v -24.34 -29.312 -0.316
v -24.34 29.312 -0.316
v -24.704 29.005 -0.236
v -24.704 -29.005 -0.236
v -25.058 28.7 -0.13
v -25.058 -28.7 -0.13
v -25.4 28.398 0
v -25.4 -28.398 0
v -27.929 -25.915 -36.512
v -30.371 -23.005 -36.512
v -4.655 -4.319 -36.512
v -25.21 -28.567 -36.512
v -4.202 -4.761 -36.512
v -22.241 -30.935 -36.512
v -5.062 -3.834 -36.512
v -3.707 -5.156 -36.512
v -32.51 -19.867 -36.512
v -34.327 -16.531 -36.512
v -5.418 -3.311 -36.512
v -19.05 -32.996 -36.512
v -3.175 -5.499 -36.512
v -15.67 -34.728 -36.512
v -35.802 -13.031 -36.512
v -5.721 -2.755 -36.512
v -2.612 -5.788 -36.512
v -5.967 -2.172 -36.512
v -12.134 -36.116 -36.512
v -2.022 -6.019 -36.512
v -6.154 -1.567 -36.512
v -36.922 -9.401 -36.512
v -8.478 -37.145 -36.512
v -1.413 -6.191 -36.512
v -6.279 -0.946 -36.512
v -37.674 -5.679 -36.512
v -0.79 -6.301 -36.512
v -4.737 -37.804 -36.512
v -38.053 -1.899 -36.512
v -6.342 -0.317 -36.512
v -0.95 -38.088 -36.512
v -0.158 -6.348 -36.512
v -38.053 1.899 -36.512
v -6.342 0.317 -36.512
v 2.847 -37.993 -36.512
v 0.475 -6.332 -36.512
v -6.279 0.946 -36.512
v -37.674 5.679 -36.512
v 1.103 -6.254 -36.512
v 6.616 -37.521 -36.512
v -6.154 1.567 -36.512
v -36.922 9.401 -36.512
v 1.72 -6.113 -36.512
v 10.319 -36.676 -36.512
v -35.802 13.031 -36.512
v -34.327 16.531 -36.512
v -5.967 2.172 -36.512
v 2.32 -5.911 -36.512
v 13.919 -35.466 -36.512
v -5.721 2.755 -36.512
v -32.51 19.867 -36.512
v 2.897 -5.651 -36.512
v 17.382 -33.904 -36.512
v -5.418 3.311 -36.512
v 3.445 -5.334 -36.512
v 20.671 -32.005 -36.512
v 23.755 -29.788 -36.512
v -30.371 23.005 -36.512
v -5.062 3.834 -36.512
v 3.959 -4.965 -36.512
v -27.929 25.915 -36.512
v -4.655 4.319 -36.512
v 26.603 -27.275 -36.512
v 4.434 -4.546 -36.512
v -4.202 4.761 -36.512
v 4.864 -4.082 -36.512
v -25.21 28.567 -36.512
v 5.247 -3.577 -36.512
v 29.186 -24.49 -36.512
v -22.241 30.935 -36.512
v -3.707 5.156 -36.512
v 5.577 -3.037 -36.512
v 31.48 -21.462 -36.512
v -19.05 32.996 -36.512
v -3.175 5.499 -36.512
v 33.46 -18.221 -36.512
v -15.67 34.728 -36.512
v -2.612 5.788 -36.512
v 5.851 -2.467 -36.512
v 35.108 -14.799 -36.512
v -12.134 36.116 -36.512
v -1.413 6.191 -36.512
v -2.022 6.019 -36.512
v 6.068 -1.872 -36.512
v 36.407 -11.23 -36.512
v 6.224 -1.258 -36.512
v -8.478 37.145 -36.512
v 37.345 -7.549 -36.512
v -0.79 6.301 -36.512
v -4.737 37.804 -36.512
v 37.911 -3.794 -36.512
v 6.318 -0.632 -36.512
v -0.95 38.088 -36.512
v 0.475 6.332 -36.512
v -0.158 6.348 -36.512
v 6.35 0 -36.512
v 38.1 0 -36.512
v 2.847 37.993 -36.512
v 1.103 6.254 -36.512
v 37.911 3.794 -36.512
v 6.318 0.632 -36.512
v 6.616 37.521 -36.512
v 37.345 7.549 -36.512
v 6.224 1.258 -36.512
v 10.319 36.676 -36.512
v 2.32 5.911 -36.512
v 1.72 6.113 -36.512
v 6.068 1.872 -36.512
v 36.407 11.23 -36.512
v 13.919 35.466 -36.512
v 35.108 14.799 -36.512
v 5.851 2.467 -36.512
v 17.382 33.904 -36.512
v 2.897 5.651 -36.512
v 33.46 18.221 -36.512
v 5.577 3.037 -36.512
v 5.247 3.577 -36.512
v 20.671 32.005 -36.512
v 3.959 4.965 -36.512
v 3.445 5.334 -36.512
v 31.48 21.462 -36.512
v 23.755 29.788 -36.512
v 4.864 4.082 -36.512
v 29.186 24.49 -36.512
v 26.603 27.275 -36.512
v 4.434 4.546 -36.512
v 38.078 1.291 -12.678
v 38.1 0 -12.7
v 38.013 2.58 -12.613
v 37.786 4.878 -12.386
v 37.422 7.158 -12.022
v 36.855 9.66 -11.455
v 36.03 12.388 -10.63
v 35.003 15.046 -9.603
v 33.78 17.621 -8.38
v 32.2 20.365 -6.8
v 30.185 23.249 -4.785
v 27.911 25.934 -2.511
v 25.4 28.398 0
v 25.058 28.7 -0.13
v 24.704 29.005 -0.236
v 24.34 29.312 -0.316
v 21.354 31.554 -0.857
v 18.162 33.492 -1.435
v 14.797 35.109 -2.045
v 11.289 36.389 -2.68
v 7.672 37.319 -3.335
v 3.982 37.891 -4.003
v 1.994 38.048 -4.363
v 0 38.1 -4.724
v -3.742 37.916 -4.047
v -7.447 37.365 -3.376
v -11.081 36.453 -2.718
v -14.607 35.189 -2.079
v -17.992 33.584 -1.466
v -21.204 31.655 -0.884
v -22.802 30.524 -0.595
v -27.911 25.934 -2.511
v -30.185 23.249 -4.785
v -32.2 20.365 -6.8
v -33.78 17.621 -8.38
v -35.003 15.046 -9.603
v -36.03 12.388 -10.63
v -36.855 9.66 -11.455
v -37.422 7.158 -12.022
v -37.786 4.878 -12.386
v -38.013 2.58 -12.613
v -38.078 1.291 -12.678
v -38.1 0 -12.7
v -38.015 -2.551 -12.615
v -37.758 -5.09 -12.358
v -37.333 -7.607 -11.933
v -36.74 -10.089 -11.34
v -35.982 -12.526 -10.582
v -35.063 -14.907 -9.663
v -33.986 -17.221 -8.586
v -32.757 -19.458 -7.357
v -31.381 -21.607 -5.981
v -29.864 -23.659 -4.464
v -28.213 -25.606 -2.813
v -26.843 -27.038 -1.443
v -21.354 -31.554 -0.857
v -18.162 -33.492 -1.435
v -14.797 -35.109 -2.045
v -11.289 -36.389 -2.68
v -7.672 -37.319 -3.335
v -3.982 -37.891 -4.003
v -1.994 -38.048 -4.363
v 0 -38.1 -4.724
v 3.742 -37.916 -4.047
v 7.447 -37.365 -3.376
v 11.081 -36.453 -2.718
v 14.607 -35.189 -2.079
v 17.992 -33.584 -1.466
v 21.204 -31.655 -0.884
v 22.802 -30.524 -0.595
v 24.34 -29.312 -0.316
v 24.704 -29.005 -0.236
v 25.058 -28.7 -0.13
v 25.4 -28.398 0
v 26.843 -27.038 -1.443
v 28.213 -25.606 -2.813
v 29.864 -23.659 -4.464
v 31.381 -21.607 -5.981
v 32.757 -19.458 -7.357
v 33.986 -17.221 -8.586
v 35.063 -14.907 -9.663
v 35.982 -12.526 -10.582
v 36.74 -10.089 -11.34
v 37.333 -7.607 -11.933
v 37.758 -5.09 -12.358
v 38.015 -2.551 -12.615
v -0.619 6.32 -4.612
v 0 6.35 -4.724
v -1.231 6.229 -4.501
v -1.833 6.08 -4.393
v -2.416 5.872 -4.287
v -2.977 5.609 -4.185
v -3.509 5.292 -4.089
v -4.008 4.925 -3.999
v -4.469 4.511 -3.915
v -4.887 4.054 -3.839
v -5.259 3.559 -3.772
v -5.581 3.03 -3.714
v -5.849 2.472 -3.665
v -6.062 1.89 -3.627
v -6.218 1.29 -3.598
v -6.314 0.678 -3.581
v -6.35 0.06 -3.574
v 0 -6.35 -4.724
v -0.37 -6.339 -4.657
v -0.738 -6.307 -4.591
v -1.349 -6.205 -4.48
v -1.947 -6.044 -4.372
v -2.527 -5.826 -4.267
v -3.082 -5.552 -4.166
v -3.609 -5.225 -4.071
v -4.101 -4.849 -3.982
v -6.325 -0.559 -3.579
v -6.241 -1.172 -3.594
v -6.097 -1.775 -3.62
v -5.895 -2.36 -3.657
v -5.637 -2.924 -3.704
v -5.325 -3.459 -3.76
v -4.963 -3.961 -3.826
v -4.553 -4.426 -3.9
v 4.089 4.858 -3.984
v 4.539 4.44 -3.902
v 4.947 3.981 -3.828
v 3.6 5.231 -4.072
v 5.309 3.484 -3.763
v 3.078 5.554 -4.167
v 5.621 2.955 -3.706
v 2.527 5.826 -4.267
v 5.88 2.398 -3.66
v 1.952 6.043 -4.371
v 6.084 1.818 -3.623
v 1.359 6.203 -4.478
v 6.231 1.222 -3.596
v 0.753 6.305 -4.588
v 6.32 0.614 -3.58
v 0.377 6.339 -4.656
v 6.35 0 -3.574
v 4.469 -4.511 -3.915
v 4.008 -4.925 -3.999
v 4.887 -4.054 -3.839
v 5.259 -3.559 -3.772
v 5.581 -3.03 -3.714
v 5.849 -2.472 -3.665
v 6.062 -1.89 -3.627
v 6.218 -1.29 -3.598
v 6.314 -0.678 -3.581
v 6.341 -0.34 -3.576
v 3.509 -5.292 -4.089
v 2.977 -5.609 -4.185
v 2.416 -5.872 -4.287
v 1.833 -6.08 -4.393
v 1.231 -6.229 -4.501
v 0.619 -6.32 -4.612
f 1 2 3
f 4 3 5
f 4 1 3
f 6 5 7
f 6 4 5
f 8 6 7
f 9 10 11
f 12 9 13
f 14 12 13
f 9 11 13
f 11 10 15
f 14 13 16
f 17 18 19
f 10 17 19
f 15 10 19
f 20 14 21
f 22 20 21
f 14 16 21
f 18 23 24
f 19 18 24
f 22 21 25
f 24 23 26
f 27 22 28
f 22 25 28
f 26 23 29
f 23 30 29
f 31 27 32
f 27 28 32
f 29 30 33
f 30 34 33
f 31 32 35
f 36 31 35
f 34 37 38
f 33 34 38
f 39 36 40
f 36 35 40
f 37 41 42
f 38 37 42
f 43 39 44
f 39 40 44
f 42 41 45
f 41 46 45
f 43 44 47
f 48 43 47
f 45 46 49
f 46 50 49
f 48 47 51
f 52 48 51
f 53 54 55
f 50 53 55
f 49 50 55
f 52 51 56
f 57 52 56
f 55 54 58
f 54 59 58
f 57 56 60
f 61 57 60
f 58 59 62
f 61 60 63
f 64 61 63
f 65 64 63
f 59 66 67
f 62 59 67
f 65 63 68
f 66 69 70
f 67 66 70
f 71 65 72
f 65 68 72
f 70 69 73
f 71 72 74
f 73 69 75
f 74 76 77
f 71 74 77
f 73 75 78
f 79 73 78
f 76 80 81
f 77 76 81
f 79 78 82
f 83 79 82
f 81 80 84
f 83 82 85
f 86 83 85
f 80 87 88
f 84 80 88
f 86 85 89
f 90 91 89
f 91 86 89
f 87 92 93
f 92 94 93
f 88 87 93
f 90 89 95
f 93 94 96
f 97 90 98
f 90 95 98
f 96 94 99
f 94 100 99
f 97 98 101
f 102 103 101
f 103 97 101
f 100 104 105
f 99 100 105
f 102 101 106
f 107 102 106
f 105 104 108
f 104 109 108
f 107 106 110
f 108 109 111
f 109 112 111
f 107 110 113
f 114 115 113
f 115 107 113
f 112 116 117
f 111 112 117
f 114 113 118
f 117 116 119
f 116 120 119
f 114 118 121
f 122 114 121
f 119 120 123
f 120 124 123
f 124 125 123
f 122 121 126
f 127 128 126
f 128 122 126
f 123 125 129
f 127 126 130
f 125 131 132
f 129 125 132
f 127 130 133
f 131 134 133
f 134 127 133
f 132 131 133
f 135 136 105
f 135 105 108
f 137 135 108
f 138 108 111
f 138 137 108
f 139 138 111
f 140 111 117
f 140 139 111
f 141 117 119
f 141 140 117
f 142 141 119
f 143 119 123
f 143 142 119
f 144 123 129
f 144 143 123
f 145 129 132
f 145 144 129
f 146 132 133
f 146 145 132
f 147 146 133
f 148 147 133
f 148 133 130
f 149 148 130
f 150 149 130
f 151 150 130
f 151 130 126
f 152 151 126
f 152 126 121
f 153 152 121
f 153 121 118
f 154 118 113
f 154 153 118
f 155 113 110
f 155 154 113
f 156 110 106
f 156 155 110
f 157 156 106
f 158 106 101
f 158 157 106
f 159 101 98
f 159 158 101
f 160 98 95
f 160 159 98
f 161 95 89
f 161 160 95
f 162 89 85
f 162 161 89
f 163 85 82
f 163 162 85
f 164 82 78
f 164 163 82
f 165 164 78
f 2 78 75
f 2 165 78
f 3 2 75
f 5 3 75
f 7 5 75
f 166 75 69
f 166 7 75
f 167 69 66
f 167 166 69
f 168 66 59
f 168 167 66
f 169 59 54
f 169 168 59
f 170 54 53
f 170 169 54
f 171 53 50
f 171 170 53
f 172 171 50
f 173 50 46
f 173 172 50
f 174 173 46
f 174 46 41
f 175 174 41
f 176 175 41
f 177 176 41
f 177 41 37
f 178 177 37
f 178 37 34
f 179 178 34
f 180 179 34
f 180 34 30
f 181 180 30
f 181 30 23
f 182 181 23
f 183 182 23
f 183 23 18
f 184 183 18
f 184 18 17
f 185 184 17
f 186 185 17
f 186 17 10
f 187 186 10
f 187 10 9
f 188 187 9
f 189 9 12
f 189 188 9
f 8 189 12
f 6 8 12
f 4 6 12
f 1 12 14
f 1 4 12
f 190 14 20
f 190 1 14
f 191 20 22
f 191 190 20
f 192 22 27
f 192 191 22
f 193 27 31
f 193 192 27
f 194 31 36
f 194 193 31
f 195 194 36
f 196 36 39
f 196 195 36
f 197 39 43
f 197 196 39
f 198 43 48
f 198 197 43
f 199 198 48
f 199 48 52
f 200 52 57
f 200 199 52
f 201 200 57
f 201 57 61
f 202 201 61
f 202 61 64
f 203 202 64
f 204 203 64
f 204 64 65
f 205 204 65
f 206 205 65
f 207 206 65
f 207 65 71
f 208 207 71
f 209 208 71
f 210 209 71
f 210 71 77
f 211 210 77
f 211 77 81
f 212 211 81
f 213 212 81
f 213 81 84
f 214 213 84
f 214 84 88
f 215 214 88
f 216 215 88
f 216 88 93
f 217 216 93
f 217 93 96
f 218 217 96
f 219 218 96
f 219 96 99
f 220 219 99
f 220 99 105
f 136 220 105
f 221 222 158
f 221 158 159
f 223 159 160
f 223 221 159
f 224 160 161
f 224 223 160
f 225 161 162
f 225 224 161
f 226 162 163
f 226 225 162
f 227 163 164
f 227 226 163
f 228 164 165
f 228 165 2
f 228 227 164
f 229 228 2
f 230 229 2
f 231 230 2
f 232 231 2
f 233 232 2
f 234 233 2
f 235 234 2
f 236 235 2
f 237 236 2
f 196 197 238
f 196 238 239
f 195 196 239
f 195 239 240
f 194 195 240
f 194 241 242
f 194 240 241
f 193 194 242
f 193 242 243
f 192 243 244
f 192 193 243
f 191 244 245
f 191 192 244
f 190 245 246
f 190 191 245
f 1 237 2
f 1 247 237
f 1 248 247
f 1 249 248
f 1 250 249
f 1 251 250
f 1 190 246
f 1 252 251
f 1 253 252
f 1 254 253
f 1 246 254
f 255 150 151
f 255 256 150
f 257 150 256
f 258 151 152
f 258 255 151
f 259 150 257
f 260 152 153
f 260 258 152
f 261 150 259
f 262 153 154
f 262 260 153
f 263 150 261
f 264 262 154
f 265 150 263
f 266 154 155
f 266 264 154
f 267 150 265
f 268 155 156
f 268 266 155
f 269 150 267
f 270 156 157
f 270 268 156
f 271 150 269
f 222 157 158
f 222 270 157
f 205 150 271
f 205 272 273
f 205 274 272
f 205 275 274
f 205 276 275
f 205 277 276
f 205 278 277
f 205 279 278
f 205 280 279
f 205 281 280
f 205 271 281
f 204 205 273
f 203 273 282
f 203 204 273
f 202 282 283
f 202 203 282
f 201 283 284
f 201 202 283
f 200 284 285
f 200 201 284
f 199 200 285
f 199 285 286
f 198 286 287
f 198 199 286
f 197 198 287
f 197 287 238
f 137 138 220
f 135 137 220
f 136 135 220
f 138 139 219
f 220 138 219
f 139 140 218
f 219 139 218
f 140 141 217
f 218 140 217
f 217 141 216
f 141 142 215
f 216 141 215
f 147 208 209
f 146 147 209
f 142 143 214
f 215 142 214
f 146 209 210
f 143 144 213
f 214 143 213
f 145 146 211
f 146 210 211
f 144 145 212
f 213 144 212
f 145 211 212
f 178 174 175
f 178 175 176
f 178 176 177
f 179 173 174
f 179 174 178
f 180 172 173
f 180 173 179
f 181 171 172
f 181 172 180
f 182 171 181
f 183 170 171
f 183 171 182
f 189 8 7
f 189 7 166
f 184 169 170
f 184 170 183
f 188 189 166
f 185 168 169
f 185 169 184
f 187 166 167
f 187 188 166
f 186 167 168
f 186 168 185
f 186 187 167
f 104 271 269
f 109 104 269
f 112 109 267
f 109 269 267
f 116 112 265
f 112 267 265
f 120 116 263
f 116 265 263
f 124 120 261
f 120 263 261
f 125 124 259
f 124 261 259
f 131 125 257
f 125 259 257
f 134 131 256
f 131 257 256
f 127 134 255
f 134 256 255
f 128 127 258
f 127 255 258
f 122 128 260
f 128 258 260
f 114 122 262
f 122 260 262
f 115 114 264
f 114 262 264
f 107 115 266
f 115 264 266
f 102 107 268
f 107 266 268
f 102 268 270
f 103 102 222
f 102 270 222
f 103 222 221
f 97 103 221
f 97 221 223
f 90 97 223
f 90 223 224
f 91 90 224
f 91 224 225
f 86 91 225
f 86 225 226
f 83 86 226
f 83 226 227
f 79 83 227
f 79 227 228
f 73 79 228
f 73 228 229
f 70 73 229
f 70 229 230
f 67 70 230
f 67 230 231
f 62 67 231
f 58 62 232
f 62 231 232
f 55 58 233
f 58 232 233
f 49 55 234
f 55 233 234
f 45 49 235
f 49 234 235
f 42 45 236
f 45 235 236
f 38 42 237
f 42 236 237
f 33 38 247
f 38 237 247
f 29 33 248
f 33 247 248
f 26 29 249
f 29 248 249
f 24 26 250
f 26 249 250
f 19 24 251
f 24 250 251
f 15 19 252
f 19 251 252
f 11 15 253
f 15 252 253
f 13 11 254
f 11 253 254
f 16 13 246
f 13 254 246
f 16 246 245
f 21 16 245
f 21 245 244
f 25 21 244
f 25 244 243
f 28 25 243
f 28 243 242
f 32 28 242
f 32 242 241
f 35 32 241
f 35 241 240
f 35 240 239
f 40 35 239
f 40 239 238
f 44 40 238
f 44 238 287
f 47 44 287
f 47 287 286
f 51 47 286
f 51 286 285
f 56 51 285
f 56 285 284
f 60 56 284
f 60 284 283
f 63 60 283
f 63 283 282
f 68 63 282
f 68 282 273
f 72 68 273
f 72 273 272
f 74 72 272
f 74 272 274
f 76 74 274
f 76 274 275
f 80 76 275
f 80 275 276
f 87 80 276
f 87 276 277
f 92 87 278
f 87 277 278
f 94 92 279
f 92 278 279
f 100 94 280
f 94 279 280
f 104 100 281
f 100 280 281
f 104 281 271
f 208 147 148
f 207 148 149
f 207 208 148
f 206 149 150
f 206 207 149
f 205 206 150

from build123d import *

# Parameters (mm, degrees)
SKETCH1_R               = 38.1
SKETCH1_R_2             = 6.35
BOSS_EXTRUDE1_DEPTH     = 36.5125
CUT_EXTRUDE2_DEPTH      = 66.0875
CUT_EXTRUDE2_DEPTH_BACK = 66.0875


with BuildPart() as part:
    # Sketch1 → Boss-Extrude1 (new body)
    with BuildSketch(Plane.XY):
        Circle(SKETCH1_R)
        Circle(SKETCH1_R_2, mode=Mode.SUBTRACT)
    extrude(amount=-BOSS_EXTRUDE1_DEPTH)

    # Sketch2 → Cut-Extrude2 (cut, two sides: drawn at the far end of the back side and taken through both)
    with BuildSketch(Plane(origin=(0, 0, 0), x_dir=(1, 0, 0), z_dir=(0, 1, 0)).offset(-CUT_EXTRUDE2_DEPTH_BACK)):
        Polygon((-38.1, 12.7), (-38.1, 0), (-25.4, 0), align=None)
        with BuildLine():
            Line((0, 0), (0, 4.7244))
            Line((0, 4.7244), (-24.339821656, 0.316401004))
            ThreePointArc((-24.339821656, 0.316401004), (-24.878689325, 0.187614988), (-25.4, 0))
            Line((-25.4, 0), (0, 0))
        make_face()
        with BuildLine():
            Line((24.339821656, 0.316401004), (0, 4.7244))
            Line((0, 4.7244), (0, 0))
            Line((0, 0), (25.4, 0))
            ThreePointArc((25.4, 0), (24.878689325, 0.187614988), (24.339821656, 0.316401004))
        make_face()
        Polygon((38.1, 12.7), (38.1, 0), (25.4, 0), align=None)
    extrude(amount=CUT_EXTRUDE2_DEPTH + CUT_EXTRUDE2_DEPTH_BACK, mode=Mode.SUBTRACT)


solid = part.part
